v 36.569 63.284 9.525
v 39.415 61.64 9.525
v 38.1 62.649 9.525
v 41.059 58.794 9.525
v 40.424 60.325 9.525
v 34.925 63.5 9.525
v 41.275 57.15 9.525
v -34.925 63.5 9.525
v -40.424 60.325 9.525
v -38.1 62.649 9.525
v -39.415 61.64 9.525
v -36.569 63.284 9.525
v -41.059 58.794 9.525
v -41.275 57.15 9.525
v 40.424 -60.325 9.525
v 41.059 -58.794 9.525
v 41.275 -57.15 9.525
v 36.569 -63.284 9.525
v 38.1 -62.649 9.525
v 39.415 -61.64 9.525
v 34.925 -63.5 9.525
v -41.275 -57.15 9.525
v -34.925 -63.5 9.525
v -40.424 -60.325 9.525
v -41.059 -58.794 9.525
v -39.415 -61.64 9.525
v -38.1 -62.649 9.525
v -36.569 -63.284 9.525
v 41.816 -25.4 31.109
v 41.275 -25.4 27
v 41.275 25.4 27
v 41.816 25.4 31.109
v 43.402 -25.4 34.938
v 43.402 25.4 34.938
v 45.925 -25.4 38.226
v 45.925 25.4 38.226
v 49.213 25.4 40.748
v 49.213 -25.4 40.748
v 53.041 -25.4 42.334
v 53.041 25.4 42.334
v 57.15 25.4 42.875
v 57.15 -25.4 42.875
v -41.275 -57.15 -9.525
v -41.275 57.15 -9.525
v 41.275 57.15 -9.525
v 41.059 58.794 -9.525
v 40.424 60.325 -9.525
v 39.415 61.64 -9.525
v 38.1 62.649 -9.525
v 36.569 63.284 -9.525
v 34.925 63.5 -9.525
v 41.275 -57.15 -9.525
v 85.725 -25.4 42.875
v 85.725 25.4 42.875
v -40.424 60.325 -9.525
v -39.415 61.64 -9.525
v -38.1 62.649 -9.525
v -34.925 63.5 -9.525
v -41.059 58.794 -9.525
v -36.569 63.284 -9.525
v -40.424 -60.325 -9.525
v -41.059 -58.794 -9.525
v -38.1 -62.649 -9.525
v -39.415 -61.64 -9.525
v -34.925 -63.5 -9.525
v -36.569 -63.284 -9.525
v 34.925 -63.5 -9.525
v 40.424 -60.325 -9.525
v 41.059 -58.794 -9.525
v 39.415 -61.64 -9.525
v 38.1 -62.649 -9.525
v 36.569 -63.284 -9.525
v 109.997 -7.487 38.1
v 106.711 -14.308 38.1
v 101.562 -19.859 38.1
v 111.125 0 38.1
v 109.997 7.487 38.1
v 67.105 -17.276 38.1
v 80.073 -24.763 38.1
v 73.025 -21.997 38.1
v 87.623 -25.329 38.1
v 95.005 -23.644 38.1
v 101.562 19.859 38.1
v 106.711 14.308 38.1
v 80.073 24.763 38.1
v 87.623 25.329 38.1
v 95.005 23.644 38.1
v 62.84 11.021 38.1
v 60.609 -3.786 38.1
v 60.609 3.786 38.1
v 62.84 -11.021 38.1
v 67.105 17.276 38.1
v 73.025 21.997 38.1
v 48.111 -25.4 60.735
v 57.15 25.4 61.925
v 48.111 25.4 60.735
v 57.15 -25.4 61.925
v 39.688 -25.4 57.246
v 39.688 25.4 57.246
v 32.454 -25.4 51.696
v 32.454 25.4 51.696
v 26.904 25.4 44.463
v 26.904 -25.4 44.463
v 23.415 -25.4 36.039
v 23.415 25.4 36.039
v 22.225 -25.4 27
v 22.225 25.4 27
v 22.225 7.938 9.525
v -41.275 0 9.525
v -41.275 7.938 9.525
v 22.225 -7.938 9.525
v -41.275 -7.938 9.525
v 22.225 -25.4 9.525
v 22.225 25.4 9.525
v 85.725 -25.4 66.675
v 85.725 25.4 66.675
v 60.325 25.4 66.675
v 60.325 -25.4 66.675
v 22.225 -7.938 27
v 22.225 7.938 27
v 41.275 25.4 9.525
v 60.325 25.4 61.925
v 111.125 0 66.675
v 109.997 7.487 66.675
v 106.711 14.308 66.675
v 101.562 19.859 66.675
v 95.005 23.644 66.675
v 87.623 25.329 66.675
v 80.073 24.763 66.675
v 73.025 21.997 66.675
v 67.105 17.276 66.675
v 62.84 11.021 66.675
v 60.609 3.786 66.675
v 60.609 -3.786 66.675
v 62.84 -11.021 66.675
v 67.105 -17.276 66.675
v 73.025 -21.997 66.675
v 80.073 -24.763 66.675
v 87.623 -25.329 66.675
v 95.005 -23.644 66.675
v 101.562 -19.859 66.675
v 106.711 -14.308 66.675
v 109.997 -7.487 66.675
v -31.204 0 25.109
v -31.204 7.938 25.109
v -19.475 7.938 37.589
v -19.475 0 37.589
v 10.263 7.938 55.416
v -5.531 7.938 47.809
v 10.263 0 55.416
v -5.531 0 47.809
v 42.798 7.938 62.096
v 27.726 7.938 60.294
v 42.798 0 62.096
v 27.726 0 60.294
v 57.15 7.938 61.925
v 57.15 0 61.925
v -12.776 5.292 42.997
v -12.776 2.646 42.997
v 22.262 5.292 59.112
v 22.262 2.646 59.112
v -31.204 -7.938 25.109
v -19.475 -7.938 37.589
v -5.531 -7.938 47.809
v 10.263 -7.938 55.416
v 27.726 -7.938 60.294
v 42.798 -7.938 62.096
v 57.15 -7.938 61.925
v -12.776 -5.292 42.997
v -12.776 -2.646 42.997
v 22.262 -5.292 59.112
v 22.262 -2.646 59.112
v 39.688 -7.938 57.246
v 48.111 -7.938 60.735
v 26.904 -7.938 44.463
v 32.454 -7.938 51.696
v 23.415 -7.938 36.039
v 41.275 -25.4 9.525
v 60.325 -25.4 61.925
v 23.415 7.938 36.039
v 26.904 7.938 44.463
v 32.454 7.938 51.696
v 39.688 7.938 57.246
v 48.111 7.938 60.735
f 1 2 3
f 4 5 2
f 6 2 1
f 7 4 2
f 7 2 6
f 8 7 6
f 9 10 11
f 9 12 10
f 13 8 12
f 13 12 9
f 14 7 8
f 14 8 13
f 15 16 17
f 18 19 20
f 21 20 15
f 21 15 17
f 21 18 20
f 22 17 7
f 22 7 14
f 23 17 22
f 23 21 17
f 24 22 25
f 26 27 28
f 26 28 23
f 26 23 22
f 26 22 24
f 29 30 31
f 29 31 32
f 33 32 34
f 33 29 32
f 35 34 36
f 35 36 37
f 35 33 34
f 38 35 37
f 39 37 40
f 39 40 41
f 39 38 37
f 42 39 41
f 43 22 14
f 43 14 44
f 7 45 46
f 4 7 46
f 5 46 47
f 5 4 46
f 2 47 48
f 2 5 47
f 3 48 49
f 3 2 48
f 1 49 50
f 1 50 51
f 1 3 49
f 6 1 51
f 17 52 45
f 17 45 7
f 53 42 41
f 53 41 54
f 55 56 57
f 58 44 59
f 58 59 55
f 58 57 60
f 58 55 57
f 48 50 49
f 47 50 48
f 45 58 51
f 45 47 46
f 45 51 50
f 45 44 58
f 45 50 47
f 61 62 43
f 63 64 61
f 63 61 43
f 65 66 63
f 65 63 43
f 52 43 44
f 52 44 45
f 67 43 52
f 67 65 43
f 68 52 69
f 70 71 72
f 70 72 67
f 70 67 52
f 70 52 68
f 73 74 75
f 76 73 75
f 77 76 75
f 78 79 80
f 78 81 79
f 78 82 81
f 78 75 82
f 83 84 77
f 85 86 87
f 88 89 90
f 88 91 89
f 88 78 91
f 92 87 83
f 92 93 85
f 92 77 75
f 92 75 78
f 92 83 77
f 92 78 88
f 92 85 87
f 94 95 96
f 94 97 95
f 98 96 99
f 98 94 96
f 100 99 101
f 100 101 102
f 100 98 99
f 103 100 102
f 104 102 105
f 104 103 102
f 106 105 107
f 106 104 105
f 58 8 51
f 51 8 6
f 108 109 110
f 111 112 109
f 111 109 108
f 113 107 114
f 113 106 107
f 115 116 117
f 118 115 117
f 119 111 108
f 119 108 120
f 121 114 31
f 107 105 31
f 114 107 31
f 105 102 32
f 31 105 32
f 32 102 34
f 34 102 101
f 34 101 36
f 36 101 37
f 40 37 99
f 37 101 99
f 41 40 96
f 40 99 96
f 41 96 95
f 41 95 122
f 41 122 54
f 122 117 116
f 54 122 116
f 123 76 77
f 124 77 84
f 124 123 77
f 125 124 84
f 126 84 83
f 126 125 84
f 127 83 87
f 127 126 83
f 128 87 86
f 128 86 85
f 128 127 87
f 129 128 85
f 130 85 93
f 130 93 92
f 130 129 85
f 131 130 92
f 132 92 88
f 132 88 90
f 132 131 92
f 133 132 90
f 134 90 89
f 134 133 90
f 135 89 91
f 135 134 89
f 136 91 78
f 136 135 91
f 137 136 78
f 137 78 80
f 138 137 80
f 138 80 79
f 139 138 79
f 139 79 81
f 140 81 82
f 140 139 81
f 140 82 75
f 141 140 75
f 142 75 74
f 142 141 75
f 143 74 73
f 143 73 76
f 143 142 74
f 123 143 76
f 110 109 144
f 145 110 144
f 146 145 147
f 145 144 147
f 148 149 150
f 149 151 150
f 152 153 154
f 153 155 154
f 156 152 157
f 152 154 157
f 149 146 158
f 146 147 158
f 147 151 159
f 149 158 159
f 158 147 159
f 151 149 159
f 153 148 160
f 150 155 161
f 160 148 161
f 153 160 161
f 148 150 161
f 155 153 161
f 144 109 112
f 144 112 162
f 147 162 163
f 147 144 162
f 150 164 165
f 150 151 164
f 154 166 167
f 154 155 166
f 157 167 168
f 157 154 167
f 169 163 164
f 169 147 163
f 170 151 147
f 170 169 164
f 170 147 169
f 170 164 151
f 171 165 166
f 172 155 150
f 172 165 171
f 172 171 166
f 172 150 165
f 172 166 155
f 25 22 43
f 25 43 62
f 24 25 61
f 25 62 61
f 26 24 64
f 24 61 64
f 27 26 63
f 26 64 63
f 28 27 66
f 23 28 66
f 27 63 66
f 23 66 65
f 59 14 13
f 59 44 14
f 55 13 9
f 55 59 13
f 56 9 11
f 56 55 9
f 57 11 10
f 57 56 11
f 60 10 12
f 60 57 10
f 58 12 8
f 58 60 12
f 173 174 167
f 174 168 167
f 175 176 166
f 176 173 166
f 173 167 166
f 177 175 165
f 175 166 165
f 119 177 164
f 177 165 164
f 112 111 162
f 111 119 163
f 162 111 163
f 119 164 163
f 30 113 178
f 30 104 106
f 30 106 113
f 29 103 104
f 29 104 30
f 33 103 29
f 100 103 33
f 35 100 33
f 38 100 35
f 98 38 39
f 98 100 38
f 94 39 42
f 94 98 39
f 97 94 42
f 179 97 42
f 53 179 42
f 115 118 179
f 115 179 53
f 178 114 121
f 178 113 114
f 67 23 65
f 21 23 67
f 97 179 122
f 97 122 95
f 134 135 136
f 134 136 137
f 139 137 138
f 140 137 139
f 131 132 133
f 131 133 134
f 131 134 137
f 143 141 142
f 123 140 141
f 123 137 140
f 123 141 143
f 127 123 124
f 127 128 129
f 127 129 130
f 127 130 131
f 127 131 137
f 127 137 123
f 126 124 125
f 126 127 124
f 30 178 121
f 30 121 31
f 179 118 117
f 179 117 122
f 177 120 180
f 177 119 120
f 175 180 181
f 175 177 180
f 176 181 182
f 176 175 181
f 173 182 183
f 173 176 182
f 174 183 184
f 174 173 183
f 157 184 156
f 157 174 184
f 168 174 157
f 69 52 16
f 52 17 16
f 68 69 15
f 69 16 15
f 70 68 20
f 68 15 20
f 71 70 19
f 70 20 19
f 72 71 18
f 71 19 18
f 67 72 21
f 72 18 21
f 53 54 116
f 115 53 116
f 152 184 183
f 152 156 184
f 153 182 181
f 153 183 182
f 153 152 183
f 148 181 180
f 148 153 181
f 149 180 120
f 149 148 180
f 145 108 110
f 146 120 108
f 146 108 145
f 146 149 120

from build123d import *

# Parameters (mm, degrees)
F1_DEPTH = 63.5
F2_DEPTH = 25.4
F3_DEPTH = 7.9375
F5_R     = 6.35


# Not quite as in the source:
# - a feature names something its author has since deleted; it is built from what else it names


with BuildPart() as f1:
    # F0 (on Front) → F1 (new body, symmetric)
    with BuildSketch(Plane.XZ):
        Polygon((-41.275, 9.525), (-41.275, -9.525), (41.275, -9.525), (41.275, 9.525), (22.225, 9.525), align=None)
    extrude(amount=F1_DEPTH, both=True)

    # F5
    f5_edges = [f1.edges().sort_by_distance(p)[0] for p in [
        (41.275, -63.5, 0),
        (-41.275, -63.5, 0),
        (41.275, 63.5, 0),
        (-41.275, 63.5, 0),
    ]]
    fillet(f5_edges, radius=F5_R)


with BuildPart() as f2:
    # F0 (on Front) → F2 (new body, symmetric)
    with BuildSketch(Plane.XZ):
        with BuildLine():
            Line((22.225, 9.525), (41.275, 9.525))
            Line((41.275, 9.525), (41.275, 27.0002))
            ThreePointArc((41.275, 27.0002), (45.9246798487, 38.2255201513), (57.15, 42.8752))
            Line((57.15, 42.8752), (60.325, 42.8752))
            Line((60.325, 42.8752), (60.325, 61.9252))
            Line((60.325, 61.9252), (57.15, 61.9252))
            ThreePointArc((57.15, 61.9252), (32.4542956671, 51.6959043329), (22.225, 27.0002))
            Line((22.225, 27.0002), (22.225, 9.525))
        make_face()
        Polygon((60.325, 66.675), (60.325, 61.9252), (60.325, 42.8752), (85.725, 42.8752), (85.725, 66.675), align=None)
    extrude(amount=F2_DEPTH, both=True)


with BuildPart() as f3:
    # F0 (on Front) → F3 (new body, symmetric)
    with BuildSketch(Plane.XZ):
        with BuildLine():
            add(Edge.make_bspline(
                [(-41.275, 9.525), (-18.2747505605, 53.0267395079), (24.5660636574, 64.4110143185), (57.15, 61.9252)],
                knots=[0, 0, 0, 0, 111.5045361635, 111.5045361635, 111.5045361635, 111.5045361635], degree=3))
            Line((-41.275, 9.525), (22.225, 9.525))
            Line((22.225, 9.525), (22.225, 27.0002))
            ThreePointArc((22.225, 27.0002), (32.4542956671, 51.6959043329), (57.15, 61.9252))
        make_face()
    extrude(amount=F3_DEPTH, both=True)


with BuildPart() as f4:
    # F0 (on Front) → F4 (revolve)
    with BuildSketch(Plane.XZ):
        Polygon((85.725, 66.675), (85.725, 42.8752), (85.725, 38.1), (111.125, 38.1), (111.125, 66.675), align=None)
    revolve(axis=Axis((85.725, 0, 52.3875), (0, 0, 1)))


solid = Compound([f1.part, f2.part, f3.part, f4.part])
